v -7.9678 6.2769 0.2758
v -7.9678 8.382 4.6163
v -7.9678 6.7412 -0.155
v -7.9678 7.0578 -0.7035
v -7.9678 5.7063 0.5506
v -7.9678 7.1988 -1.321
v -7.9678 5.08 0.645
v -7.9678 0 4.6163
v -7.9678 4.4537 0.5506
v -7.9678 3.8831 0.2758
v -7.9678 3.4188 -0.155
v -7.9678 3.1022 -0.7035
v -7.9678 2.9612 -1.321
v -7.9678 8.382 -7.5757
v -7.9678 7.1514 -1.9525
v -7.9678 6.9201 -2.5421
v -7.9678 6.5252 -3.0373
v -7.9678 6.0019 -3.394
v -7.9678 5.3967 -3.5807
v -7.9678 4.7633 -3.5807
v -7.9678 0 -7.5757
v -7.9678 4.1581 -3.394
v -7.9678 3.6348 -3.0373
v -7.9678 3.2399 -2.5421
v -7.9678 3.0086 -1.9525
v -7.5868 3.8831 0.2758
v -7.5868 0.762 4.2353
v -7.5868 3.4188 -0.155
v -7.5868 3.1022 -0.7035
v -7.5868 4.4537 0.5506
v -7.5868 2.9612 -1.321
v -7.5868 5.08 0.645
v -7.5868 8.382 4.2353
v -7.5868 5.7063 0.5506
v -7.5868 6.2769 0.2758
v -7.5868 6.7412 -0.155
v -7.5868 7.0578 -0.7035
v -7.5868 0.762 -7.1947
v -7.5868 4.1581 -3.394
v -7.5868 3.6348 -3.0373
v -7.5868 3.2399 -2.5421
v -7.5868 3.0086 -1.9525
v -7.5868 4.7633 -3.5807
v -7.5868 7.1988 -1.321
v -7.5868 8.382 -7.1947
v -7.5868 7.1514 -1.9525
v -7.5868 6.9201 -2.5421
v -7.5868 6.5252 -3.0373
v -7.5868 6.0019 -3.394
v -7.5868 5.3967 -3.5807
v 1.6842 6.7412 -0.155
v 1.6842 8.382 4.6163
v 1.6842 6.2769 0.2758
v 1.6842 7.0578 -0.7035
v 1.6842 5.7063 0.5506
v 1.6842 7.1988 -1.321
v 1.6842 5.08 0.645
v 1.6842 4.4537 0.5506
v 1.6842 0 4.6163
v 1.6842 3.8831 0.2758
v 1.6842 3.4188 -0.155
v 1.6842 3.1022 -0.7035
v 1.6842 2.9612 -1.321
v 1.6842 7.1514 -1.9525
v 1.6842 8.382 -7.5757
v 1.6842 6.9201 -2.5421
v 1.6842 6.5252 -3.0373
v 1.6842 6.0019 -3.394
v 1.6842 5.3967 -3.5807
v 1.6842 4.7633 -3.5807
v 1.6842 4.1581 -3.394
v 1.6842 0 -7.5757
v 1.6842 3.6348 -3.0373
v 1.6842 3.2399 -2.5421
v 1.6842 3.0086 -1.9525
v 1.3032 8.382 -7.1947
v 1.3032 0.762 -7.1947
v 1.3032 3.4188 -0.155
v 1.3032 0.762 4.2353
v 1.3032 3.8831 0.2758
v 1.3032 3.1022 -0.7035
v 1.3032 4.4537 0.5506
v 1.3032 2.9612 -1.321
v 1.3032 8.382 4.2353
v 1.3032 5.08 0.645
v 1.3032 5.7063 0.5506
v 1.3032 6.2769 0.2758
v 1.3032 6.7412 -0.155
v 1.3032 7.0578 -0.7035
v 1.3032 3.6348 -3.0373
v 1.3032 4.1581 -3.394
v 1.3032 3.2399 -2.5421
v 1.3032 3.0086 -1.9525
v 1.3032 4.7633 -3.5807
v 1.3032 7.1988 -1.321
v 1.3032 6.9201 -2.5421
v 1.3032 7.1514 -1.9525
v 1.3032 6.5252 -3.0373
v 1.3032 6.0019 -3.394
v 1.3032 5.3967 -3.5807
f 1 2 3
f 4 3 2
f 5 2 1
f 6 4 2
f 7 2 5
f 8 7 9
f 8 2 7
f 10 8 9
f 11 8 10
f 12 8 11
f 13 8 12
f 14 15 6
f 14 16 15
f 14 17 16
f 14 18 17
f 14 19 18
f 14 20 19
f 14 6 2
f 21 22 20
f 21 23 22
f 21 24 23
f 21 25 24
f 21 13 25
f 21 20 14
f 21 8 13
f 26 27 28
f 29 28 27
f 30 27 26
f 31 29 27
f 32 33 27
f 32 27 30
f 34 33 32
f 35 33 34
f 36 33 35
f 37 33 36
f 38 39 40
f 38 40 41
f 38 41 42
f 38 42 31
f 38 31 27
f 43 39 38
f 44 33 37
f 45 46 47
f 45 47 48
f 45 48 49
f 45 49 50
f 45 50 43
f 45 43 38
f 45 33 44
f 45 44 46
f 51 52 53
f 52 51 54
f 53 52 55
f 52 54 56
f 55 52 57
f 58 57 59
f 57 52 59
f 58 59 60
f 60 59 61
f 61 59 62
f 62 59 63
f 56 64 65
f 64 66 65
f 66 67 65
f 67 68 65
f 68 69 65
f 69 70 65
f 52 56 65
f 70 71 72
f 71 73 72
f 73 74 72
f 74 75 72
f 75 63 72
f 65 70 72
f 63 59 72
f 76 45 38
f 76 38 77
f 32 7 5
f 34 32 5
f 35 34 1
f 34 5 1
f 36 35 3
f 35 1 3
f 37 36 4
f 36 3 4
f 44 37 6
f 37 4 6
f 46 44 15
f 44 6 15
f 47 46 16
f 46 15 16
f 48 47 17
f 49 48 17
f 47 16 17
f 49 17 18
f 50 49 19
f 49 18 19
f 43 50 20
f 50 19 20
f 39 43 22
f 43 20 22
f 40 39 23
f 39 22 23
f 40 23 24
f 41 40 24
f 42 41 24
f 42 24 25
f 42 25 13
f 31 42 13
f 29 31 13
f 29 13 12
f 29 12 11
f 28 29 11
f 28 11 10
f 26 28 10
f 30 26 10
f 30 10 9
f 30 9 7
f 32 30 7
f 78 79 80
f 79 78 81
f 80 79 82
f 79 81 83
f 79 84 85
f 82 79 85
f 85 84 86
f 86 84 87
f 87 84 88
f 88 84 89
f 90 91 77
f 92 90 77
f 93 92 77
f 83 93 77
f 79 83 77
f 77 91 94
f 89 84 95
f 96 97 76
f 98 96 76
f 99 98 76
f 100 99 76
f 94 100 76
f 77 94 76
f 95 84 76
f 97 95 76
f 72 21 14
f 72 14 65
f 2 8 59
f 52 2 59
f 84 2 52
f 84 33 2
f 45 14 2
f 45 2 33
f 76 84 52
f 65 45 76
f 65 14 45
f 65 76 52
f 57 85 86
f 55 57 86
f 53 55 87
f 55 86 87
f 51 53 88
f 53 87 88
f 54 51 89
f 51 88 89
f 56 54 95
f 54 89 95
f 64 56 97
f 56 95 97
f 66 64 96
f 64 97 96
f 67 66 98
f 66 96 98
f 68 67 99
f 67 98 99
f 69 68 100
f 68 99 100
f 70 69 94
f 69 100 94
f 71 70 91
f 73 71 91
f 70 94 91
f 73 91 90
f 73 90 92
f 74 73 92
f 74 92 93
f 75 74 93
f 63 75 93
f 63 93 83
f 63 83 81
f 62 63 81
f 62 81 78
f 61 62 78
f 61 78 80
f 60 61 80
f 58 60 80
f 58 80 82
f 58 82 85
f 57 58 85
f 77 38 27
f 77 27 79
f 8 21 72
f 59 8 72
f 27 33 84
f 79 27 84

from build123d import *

# Parameters (mm, degrees)
SKETCH1_W           = 9.652
SKETCH1_H           = 12.192
BOSS_EXTRUDE1_DEPTH = 8.382
SKETCH4_W           = 8.89
SKETCH4_H           = 11.43
CUT_EXTRUDE1_DEPTH  = 7.62
SKETCH6_R           = 2.12471
CUT_EXTRUDE2_DEPTH  = 10.652


with BuildPart() as part:
    # Sketch1 → Boss-Extrude1 (new body)
    with BuildSketch(Plane(origin=(0, 0, 0), x_dir=(1, 0, 0), z_dir=(0, 1, 0))):
        with Locations((-3.14180083, 1.47973444)):
            Rectangle(SKETCH1_W, SKETCH1_H)
    extrude(amount=BOSS_EXTRUDE1_DEPTH)

    # Sketch4 → Cut-Extrude1 (cut)
    with BuildSketch(Plane(origin=(0, 8.382, 0), x_dir=(1, 0, 0), z_dir=(0, 1, 0))):
        with Locations((-3.14180083, 1.47973444)):
            Rectangle(SKETCH4_W, SKETCH4_H)
    extrude(amount=-CUT_EXTRUDE1_DEPTH, mode=Mode.SUBTRACT)

    # Sketch6 → Cut-Extrude2 (cut, through all)
    with BuildSketch(Plane.ZY.offset(7.96780083)):
        with Locations((-1.47973444, 5.08)):
            Circle(SKETCH6_R)
    extrude(amount=-CUT_EXTRUDE2_DEPTH, mode=Mode.SUBTRACT)


solid = part.part
